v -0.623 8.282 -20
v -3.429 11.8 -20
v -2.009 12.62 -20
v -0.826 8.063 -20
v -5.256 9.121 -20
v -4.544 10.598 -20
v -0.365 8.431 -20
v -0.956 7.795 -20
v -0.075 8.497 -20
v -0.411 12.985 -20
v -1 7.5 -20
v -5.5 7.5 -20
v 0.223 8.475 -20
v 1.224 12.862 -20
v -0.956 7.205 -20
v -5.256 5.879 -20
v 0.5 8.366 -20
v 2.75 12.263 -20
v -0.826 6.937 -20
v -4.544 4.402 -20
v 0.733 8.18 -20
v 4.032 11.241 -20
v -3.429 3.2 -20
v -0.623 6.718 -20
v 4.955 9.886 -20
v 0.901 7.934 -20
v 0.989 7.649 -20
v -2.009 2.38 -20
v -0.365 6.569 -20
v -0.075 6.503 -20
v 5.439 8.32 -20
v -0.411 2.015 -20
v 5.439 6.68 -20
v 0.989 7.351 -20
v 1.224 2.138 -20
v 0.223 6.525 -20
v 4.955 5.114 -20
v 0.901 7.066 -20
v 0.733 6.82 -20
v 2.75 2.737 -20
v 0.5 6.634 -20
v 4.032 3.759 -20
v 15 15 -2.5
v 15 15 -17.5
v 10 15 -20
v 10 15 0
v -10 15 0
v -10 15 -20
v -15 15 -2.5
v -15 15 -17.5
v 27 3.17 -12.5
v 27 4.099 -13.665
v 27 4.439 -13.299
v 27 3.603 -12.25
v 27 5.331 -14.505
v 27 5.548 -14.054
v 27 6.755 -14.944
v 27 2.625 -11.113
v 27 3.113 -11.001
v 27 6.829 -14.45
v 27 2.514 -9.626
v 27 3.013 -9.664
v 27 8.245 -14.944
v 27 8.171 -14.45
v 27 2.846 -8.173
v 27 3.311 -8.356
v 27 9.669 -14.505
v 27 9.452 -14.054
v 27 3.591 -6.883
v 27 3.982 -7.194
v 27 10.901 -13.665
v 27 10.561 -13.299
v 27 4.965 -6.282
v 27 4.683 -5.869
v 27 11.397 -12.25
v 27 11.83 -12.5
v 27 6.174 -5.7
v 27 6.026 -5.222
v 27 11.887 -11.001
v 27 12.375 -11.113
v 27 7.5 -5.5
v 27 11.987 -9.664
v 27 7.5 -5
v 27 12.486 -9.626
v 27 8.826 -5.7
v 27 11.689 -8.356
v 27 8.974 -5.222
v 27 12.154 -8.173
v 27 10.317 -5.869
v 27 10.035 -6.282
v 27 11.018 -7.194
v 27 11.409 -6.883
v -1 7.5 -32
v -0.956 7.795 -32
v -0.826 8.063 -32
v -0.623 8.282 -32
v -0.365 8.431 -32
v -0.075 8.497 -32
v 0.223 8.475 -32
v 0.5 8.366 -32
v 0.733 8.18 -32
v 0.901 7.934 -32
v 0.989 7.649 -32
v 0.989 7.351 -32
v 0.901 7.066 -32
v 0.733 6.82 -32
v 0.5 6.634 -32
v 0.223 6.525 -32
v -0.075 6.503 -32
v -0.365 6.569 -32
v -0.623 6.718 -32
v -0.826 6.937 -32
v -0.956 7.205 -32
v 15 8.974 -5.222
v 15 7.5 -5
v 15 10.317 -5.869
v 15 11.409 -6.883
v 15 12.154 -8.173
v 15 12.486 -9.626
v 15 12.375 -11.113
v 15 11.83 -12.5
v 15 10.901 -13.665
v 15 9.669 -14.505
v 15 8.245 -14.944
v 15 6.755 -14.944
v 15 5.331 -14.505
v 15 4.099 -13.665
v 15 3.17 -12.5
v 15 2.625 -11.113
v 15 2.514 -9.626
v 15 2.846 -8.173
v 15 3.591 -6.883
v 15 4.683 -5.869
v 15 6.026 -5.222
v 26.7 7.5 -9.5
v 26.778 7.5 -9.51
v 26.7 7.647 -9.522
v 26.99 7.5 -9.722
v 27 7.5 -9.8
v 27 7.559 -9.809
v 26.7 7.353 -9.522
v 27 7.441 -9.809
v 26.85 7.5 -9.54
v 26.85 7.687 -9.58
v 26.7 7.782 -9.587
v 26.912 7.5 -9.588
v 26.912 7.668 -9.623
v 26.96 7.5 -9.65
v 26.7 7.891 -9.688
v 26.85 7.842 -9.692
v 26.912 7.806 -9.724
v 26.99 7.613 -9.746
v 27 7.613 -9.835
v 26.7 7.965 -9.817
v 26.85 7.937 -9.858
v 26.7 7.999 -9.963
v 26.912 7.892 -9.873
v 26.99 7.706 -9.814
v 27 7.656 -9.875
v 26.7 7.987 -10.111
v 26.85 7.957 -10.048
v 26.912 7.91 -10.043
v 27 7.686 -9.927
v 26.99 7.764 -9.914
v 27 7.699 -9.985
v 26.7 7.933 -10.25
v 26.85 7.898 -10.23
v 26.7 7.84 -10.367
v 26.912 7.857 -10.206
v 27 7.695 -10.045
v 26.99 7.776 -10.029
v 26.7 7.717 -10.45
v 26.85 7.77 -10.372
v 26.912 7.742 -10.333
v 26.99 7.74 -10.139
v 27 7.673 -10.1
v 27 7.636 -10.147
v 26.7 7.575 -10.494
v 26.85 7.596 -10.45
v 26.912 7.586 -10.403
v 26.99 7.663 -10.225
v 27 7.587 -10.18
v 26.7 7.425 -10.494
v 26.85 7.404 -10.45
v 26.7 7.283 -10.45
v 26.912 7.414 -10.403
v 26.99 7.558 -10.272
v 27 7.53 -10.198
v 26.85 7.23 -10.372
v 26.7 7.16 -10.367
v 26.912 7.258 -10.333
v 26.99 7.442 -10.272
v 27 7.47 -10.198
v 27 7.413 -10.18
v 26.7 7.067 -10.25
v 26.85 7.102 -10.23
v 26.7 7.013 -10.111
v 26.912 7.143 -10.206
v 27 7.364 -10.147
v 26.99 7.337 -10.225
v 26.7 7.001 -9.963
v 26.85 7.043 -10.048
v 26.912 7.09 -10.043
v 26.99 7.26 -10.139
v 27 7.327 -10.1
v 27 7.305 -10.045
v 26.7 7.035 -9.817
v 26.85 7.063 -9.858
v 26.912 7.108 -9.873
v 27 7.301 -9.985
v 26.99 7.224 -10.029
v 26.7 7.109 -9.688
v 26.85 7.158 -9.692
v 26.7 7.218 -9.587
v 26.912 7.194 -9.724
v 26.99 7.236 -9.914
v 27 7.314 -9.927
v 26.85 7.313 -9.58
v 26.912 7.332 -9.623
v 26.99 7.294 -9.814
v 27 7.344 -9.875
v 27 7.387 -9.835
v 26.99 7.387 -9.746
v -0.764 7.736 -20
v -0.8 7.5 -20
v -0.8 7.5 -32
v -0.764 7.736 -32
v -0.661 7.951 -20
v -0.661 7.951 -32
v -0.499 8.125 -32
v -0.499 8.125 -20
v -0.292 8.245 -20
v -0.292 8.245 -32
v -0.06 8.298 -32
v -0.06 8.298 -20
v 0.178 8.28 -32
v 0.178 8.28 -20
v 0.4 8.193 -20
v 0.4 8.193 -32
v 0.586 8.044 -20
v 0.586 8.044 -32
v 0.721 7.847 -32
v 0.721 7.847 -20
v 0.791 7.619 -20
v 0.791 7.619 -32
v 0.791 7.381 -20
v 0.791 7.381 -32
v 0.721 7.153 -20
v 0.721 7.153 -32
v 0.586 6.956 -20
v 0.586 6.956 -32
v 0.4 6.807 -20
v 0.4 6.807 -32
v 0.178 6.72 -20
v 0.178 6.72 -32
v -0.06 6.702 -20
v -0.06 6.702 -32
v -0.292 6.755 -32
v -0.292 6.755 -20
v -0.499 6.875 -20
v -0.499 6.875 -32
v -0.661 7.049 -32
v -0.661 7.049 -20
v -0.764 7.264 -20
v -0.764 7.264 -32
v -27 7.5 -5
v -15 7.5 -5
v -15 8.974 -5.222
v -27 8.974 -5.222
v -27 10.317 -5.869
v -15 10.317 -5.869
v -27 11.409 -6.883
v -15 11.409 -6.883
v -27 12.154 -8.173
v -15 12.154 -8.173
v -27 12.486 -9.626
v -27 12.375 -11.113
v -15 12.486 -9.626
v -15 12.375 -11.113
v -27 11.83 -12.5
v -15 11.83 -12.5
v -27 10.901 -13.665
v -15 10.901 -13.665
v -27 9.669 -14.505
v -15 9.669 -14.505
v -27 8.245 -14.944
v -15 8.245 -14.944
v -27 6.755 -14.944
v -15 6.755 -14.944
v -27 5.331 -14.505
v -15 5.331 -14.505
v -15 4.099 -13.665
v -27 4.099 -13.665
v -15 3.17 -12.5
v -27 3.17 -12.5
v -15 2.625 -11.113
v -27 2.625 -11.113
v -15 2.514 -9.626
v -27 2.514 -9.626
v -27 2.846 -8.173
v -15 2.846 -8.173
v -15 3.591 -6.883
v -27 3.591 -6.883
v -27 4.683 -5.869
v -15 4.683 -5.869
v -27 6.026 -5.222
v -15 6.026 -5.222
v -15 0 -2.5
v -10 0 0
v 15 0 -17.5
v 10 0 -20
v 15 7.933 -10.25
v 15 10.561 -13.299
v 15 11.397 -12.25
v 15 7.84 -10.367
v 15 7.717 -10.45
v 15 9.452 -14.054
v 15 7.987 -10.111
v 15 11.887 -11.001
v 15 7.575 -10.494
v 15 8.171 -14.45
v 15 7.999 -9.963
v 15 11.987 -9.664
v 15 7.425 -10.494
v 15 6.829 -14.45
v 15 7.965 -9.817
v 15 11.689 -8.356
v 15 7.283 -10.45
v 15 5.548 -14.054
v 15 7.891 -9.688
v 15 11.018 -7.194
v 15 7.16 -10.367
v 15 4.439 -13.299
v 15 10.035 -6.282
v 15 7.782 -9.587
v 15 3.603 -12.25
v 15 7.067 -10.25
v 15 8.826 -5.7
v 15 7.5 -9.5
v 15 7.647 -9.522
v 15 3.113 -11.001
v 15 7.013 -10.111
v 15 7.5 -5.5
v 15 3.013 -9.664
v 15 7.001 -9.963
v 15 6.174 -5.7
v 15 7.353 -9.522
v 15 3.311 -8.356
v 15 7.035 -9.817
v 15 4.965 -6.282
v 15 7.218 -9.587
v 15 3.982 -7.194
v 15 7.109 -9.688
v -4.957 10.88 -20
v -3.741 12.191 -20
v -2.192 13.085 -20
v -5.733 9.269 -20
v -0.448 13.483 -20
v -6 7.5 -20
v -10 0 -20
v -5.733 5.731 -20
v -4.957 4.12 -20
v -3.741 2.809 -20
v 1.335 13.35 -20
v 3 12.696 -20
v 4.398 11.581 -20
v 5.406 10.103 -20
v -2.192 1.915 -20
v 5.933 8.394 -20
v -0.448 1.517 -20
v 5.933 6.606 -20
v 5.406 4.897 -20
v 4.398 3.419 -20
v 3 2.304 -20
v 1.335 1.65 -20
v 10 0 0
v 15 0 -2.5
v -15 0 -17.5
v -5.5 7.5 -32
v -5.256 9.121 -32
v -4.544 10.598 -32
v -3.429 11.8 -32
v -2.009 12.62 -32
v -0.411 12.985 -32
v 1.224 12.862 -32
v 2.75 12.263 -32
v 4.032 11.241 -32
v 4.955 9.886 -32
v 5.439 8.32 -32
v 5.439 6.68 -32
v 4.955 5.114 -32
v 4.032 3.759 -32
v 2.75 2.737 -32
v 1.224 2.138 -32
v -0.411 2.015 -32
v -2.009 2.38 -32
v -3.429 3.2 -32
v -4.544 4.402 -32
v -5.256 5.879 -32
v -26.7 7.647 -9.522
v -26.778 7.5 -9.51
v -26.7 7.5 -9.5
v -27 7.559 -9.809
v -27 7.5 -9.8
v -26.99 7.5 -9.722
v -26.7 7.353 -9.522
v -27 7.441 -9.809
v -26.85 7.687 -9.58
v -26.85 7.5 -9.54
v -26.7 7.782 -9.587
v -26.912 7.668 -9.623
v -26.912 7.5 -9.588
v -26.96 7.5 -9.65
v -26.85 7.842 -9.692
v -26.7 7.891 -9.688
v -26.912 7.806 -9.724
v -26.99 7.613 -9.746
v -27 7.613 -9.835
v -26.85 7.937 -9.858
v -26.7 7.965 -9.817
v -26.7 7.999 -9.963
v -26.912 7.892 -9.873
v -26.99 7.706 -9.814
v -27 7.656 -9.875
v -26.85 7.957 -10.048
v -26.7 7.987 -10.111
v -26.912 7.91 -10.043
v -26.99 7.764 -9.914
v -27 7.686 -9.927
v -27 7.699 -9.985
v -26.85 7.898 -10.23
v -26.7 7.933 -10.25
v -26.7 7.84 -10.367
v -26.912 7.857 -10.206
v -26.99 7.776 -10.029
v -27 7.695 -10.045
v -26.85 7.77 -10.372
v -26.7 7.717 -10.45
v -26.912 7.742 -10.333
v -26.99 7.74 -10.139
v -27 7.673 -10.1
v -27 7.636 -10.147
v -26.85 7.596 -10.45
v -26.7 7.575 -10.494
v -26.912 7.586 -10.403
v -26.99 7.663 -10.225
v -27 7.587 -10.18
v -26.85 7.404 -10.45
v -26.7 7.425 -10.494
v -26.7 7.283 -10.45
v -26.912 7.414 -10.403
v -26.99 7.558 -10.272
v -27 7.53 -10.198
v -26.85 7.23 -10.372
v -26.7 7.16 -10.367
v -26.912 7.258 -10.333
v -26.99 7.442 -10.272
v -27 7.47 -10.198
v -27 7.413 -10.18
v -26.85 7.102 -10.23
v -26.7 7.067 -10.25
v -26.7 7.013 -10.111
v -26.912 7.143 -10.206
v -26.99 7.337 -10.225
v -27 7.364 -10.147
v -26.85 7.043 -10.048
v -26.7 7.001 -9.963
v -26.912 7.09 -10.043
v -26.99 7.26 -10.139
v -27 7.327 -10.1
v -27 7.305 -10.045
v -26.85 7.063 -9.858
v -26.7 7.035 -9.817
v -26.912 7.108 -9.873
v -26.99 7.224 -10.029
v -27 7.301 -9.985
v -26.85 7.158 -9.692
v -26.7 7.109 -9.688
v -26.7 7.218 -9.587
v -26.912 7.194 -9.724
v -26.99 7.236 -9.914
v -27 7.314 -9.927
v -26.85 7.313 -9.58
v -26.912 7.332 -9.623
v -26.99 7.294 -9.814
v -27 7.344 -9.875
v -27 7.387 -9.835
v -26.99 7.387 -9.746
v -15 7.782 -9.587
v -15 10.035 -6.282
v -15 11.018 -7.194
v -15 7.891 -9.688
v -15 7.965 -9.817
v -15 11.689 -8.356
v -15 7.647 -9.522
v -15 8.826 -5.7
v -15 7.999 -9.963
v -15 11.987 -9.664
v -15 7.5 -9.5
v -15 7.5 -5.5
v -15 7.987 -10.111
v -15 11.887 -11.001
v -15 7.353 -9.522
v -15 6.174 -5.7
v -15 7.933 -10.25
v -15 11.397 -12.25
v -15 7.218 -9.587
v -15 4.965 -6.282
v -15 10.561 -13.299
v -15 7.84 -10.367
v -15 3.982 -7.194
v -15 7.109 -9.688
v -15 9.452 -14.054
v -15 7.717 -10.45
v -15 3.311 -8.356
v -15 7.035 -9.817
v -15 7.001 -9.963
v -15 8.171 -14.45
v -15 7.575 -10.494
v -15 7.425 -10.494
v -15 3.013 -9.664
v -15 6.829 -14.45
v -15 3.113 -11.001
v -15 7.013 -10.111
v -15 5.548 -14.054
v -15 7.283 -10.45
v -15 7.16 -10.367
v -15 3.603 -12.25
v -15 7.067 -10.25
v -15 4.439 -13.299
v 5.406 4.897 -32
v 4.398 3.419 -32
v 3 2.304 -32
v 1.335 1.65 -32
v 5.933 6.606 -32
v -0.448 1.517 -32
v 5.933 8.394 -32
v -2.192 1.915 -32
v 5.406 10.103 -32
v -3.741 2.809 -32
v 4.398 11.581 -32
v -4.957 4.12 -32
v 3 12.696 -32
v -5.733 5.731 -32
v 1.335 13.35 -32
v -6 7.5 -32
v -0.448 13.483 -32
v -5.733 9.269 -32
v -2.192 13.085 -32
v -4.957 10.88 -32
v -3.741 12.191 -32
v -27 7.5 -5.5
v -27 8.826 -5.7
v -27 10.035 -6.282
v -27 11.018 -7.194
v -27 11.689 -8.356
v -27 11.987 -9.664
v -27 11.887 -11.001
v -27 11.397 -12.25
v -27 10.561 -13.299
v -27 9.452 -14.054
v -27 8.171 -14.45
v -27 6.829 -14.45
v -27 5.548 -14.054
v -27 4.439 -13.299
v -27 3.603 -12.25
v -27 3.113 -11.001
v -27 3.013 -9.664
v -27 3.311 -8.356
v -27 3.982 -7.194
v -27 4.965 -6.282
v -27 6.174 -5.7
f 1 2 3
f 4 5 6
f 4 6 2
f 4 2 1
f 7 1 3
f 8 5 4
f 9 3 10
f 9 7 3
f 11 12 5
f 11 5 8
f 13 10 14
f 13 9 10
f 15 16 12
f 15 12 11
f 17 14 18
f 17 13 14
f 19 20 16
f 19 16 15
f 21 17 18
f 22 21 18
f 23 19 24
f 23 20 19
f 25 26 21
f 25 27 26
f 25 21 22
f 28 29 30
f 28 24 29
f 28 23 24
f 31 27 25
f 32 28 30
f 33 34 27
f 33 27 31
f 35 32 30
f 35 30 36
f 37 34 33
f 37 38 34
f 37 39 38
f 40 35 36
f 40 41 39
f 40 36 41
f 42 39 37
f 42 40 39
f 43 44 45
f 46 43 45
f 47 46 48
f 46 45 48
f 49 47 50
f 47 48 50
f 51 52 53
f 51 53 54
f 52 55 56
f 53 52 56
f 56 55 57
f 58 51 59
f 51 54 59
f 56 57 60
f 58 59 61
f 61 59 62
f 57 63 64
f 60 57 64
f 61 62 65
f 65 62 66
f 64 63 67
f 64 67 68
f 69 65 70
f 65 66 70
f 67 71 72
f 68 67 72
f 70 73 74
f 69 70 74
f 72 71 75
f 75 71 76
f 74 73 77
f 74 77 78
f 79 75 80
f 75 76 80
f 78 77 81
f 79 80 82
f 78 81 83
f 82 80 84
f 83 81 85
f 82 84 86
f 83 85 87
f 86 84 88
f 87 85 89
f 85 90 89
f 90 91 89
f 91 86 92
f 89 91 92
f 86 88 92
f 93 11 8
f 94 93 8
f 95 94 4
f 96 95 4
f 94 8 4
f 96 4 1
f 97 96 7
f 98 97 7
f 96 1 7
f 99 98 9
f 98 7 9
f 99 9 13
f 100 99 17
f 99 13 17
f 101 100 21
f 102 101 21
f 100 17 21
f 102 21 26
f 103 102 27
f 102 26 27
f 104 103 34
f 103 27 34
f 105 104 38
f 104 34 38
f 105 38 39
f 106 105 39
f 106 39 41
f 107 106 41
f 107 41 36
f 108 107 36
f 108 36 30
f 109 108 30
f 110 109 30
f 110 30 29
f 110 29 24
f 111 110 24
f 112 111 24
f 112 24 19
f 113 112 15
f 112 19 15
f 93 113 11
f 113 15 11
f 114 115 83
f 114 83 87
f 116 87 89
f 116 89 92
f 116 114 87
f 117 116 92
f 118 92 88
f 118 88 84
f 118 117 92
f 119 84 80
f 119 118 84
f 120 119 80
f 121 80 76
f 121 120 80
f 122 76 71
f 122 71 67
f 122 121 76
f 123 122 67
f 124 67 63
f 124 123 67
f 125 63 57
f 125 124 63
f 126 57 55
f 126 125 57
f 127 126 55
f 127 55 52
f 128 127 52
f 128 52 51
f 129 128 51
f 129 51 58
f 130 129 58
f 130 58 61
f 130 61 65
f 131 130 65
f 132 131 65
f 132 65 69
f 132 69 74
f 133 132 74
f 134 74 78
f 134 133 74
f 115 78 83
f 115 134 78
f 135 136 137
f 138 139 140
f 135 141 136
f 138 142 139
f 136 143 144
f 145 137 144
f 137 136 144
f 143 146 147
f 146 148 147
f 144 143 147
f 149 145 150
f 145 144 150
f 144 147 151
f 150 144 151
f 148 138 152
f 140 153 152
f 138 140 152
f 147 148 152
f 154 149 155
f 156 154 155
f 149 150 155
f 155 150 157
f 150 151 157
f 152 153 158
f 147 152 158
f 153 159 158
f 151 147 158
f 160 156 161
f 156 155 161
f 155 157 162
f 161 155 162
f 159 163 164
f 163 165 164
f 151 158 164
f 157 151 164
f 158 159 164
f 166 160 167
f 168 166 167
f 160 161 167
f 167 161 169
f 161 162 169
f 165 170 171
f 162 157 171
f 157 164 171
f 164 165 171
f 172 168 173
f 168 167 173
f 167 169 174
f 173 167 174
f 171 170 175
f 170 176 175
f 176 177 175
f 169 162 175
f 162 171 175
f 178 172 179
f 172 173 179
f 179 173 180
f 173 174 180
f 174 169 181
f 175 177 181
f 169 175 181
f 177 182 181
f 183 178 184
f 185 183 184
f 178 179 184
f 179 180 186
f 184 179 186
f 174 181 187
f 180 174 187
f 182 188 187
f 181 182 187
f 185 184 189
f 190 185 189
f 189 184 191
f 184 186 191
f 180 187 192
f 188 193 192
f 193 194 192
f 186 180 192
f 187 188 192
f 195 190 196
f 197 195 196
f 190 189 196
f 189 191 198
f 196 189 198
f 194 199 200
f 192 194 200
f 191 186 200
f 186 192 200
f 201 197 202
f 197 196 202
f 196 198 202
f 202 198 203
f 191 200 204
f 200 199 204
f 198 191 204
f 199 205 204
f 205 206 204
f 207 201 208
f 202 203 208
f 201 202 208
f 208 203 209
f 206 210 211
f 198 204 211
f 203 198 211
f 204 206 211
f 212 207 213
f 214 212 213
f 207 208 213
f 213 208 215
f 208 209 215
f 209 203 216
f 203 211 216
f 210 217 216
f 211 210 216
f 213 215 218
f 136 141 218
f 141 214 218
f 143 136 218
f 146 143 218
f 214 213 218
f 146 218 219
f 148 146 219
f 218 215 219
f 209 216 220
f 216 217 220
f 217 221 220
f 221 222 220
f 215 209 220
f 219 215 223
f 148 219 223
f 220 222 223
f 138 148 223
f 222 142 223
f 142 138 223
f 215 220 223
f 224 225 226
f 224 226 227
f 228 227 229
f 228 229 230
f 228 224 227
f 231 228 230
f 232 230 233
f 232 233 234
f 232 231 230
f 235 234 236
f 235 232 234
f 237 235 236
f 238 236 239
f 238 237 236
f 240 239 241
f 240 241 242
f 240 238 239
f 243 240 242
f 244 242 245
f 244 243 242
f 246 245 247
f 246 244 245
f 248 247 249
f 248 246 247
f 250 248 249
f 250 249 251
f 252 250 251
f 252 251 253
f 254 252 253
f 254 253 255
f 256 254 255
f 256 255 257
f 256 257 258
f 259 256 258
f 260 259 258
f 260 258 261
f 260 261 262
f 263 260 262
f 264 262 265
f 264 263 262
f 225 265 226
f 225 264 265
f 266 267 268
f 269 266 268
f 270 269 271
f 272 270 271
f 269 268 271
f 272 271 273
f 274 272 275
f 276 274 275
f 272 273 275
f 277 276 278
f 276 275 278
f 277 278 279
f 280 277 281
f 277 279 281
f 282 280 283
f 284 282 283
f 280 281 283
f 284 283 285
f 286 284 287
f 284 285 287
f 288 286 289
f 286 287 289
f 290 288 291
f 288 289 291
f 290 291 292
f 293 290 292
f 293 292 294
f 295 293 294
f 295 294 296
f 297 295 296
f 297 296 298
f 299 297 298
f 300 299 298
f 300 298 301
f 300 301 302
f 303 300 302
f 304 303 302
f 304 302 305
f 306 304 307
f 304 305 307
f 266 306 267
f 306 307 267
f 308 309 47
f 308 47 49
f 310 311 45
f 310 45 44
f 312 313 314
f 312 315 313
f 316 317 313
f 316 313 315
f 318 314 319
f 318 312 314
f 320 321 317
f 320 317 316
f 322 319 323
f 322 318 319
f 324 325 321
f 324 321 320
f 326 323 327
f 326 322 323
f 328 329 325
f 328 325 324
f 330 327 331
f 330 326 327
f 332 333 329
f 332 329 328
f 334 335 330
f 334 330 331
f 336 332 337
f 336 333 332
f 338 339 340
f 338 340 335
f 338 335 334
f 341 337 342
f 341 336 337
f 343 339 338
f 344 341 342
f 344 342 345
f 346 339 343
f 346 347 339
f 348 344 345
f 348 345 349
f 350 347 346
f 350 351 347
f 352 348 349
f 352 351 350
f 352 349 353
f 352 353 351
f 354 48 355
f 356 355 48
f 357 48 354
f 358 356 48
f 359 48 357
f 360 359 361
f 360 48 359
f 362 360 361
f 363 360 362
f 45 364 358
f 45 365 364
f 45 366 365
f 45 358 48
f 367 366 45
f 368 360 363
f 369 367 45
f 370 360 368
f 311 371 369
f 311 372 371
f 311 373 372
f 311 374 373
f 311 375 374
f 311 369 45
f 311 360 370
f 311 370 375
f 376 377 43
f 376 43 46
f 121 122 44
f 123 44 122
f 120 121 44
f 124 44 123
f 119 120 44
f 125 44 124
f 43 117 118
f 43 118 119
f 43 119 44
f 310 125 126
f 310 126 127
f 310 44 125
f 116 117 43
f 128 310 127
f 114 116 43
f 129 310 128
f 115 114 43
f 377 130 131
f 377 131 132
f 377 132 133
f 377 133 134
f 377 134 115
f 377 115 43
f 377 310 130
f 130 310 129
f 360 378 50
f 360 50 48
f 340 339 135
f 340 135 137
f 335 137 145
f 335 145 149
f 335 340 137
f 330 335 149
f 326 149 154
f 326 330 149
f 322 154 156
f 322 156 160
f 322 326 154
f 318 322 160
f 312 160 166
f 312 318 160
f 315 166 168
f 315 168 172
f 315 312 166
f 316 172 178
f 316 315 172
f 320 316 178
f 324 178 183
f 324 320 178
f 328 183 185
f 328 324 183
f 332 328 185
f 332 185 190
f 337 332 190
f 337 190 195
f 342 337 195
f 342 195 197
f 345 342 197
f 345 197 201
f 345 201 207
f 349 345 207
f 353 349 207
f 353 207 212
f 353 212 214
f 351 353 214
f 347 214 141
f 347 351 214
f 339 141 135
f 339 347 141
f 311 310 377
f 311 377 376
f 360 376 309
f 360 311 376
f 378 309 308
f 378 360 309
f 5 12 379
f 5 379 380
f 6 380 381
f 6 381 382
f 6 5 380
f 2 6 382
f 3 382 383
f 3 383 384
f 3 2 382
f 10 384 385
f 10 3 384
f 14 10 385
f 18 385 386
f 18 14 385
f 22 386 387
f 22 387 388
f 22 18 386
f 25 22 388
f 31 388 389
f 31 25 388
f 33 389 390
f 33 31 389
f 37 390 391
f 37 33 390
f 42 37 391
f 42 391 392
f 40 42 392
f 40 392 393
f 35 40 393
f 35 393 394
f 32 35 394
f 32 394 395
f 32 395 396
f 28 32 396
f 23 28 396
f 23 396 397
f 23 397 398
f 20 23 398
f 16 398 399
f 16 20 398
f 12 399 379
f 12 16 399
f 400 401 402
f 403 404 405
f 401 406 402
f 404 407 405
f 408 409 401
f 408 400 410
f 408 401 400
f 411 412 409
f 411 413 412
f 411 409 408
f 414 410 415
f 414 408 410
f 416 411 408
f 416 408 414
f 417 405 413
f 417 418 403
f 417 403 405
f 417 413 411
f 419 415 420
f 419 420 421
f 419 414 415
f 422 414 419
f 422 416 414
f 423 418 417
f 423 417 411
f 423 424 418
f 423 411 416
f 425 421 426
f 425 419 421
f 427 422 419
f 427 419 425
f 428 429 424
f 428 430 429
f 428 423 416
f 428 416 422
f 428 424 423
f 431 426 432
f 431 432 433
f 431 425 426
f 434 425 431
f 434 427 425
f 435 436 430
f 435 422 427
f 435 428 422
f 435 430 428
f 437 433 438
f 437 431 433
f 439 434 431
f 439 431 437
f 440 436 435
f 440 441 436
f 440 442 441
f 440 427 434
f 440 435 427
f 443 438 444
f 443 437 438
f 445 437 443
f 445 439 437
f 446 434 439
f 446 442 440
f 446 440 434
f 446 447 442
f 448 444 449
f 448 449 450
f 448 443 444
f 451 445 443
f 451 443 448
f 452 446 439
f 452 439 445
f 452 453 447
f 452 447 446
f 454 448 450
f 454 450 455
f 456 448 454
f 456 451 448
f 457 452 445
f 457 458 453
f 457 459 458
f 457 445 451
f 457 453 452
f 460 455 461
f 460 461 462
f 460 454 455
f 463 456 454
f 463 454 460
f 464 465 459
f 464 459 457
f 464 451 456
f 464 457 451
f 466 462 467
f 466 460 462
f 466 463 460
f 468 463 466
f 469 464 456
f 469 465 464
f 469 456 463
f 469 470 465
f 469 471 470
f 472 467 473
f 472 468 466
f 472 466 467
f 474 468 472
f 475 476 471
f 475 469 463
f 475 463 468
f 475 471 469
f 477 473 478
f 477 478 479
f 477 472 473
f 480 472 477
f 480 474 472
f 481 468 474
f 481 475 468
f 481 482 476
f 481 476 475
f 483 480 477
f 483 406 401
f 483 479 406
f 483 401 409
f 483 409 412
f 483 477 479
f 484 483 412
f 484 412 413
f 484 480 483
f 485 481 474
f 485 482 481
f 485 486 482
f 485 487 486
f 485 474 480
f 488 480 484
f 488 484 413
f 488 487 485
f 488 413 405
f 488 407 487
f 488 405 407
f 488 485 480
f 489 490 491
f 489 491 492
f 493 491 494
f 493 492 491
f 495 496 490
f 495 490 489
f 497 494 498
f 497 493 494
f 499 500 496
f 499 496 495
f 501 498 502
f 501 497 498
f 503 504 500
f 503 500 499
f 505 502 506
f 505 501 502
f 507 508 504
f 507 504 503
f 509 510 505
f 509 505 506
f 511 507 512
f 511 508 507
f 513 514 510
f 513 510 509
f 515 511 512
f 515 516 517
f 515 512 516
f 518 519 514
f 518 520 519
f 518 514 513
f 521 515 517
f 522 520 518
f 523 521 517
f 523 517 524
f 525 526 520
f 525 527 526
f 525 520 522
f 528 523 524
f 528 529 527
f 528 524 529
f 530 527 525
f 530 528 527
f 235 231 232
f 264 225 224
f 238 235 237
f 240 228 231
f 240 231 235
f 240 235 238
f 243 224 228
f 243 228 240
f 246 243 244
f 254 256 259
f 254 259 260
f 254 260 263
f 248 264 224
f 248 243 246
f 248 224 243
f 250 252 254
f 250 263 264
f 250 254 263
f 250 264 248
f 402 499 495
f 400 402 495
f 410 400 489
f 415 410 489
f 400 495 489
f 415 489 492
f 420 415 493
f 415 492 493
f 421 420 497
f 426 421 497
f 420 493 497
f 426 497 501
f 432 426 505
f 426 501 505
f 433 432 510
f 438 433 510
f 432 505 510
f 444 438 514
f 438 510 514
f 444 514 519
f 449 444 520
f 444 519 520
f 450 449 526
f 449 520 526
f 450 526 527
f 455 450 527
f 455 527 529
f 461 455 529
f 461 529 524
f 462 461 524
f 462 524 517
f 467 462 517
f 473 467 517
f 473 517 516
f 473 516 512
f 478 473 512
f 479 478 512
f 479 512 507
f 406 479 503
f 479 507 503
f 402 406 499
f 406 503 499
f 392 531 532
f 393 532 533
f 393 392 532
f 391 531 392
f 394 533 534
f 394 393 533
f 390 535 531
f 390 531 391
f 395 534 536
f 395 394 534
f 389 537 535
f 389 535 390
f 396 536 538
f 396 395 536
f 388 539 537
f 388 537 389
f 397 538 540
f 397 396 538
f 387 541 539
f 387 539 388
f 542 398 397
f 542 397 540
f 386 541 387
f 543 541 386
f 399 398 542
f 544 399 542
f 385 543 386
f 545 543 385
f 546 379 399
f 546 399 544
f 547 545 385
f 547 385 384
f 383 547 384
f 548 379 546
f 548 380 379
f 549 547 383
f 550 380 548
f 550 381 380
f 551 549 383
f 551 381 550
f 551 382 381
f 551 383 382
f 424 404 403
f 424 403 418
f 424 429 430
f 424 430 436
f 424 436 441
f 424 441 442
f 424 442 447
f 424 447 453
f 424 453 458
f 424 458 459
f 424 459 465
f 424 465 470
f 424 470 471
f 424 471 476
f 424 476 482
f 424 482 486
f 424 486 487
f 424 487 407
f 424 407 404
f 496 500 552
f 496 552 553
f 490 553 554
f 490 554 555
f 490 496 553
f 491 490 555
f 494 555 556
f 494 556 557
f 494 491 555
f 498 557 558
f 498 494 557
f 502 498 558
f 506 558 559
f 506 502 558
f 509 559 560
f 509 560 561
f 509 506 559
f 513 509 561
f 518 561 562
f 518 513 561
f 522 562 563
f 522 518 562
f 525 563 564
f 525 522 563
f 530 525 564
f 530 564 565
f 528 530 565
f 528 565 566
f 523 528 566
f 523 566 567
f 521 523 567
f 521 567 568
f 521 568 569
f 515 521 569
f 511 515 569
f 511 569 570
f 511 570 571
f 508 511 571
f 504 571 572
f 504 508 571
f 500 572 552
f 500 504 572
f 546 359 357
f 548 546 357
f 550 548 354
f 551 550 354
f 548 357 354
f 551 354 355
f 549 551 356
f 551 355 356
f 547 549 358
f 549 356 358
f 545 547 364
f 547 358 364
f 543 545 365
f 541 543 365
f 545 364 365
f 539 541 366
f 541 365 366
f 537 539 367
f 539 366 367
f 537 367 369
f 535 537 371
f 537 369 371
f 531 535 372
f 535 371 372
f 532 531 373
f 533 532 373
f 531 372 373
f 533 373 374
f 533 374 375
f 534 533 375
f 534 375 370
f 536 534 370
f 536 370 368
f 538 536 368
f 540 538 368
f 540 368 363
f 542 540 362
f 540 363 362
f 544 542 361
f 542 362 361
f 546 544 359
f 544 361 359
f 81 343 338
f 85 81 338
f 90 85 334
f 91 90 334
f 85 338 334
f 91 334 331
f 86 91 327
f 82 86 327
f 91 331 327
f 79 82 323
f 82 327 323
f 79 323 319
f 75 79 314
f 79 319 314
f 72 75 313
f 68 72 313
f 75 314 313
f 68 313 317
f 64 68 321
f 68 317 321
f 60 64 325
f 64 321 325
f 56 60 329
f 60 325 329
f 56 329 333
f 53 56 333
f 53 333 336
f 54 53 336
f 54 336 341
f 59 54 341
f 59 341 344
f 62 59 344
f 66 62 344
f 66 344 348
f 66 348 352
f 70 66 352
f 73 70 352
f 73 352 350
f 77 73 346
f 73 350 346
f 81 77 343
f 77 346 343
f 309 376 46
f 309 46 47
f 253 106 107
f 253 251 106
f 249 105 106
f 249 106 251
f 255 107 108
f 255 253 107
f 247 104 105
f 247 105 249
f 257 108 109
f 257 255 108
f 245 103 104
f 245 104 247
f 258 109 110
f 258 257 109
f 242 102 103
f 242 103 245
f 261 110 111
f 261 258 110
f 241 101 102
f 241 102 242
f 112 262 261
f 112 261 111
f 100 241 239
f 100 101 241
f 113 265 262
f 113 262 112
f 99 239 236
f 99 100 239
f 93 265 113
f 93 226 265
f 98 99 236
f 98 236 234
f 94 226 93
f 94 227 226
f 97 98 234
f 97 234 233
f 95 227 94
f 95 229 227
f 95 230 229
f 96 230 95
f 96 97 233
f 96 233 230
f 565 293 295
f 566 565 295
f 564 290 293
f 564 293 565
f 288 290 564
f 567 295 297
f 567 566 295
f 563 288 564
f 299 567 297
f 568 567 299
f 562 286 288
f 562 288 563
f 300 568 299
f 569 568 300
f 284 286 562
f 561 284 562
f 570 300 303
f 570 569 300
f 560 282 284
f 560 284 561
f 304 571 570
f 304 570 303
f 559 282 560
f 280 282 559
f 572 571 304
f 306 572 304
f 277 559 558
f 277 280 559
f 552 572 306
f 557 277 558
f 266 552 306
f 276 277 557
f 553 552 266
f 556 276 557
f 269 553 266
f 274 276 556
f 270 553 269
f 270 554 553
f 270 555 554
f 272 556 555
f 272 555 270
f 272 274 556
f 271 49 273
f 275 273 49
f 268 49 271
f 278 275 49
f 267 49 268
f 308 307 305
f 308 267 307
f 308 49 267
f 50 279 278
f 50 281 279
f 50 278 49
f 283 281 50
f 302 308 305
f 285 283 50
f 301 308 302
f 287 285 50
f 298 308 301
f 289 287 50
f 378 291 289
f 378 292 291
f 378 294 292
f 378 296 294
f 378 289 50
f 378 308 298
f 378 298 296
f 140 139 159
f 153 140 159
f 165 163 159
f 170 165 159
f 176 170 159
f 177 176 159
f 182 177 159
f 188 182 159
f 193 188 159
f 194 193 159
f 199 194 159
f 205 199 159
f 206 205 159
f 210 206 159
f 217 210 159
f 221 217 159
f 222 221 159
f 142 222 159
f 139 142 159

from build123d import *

# Parameters (mm, degrees)
BOSS_EXTRUDE1_DEPTH  = 15
SKETCH2_R            = 6
SKETCH2_R_2          = 5.5
BOSS_EXTRUDE2_DEPTH  = 12
SKETCH3_R            = 1
SKETCH3_R_2          = 0.8
BOSS_EXTRUDE3_DEPTH  = 12
SKETCH4_R            = 5
SKETCH4_R_2          = 4.5
SKETCH4_R_3          = 0.5
BOSS_EXTRUDE4_DEPTH  = 12
FILLET2_R            = 0.3
FILLET2_OF_MIRROR1_R = 0.3


with BuildPart() as part:
    # Sketch1 → Boss-Extrude1 (new body)
    with BuildSketch(Plane(origin=(0, 0, 0), x_dir=(1, 0, 0), z_dir=(0, 1, 0))):
        Polygon((10, 20), (15, 17.5), (15, 2.5), (10, 0), (-10, 0), (-15, 2.5), (-15, 17.5), (-10, 20), align=None)
    extrude(amount=BOSS_EXTRUDE1_DEPTH)

    # Sketch2 → Boss-Extrude2 (add)
    with BuildSketch(Plane(origin=(0, 0, -20), x_dir=(-1, 0, 0), z_dir=(0, 0, -1))):
        with Locations((0, 7.5)):
            Circle(SKETCH2_R)
        with Locations((0, 7.5)):
            Circle(SKETCH2_R_2, mode=Mode.SUBTRACT)
    extrude(amount=BOSS_EXTRUDE2_DEPTH)

    # Sketch3 → Boss-Extrude3 (add)
    with BuildSketch(Plane(origin=(0, 0, -20), x_dir=(-1, 0, 0), z_dir=(0, 0, -1))):
        with Locations((0, 7.5)):
            Circle(SKETCH3_R)
        with Locations((0, 7.5)):
            Circle(SKETCH3_R_2, mode=Mode.SUBTRACT)
    extrude(amount=BOSS_EXTRUDE3_DEPTH)

    # Sketch4 → Boss-Extrude4 (add)
    with BuildSketch(Plane.ZY.offset(15)):
        with Locations((-10, 7.5)):
            Circle(SKETCH4_R)
        with Locations((-10, 7.5)):
            Circle(SKETCH4_R_2, mode=Mode.SUBTRACT)
        with Locations((-10, 7.5)):
            Circle(SKETCH4_R_3)
    boss_extrude4 = extrude(amount=BOSS_EXTRUDE4_DEPTH)

    # Fillet2
    fillet2_edges = [part.edges().sort_by_distance(p)[0] for p in [
        (-27, 7.5, -10.5),
    ]]
    fillet(fillet2_edges, radius=FILLET2_R)

    # Mirror1: Boss-Extrude4 across plane
    add(boss_extrude4.mirror(Plane(origin=(0, 0, 0), x_dir=(0, 0, 1), z_dir=(1, 0, 0))))

    # Fillet2 of Mirror1
    fillet2_of_mirror1_edges = [part.edges().sort_by_distance(p)[0] for p in [
        (27, 7.5, -10.5),
    ]]
    fillet(fillet2_of_mirror1_edges, radius=FILLET2_OF_MIRROR1_R)


solid = part.part
